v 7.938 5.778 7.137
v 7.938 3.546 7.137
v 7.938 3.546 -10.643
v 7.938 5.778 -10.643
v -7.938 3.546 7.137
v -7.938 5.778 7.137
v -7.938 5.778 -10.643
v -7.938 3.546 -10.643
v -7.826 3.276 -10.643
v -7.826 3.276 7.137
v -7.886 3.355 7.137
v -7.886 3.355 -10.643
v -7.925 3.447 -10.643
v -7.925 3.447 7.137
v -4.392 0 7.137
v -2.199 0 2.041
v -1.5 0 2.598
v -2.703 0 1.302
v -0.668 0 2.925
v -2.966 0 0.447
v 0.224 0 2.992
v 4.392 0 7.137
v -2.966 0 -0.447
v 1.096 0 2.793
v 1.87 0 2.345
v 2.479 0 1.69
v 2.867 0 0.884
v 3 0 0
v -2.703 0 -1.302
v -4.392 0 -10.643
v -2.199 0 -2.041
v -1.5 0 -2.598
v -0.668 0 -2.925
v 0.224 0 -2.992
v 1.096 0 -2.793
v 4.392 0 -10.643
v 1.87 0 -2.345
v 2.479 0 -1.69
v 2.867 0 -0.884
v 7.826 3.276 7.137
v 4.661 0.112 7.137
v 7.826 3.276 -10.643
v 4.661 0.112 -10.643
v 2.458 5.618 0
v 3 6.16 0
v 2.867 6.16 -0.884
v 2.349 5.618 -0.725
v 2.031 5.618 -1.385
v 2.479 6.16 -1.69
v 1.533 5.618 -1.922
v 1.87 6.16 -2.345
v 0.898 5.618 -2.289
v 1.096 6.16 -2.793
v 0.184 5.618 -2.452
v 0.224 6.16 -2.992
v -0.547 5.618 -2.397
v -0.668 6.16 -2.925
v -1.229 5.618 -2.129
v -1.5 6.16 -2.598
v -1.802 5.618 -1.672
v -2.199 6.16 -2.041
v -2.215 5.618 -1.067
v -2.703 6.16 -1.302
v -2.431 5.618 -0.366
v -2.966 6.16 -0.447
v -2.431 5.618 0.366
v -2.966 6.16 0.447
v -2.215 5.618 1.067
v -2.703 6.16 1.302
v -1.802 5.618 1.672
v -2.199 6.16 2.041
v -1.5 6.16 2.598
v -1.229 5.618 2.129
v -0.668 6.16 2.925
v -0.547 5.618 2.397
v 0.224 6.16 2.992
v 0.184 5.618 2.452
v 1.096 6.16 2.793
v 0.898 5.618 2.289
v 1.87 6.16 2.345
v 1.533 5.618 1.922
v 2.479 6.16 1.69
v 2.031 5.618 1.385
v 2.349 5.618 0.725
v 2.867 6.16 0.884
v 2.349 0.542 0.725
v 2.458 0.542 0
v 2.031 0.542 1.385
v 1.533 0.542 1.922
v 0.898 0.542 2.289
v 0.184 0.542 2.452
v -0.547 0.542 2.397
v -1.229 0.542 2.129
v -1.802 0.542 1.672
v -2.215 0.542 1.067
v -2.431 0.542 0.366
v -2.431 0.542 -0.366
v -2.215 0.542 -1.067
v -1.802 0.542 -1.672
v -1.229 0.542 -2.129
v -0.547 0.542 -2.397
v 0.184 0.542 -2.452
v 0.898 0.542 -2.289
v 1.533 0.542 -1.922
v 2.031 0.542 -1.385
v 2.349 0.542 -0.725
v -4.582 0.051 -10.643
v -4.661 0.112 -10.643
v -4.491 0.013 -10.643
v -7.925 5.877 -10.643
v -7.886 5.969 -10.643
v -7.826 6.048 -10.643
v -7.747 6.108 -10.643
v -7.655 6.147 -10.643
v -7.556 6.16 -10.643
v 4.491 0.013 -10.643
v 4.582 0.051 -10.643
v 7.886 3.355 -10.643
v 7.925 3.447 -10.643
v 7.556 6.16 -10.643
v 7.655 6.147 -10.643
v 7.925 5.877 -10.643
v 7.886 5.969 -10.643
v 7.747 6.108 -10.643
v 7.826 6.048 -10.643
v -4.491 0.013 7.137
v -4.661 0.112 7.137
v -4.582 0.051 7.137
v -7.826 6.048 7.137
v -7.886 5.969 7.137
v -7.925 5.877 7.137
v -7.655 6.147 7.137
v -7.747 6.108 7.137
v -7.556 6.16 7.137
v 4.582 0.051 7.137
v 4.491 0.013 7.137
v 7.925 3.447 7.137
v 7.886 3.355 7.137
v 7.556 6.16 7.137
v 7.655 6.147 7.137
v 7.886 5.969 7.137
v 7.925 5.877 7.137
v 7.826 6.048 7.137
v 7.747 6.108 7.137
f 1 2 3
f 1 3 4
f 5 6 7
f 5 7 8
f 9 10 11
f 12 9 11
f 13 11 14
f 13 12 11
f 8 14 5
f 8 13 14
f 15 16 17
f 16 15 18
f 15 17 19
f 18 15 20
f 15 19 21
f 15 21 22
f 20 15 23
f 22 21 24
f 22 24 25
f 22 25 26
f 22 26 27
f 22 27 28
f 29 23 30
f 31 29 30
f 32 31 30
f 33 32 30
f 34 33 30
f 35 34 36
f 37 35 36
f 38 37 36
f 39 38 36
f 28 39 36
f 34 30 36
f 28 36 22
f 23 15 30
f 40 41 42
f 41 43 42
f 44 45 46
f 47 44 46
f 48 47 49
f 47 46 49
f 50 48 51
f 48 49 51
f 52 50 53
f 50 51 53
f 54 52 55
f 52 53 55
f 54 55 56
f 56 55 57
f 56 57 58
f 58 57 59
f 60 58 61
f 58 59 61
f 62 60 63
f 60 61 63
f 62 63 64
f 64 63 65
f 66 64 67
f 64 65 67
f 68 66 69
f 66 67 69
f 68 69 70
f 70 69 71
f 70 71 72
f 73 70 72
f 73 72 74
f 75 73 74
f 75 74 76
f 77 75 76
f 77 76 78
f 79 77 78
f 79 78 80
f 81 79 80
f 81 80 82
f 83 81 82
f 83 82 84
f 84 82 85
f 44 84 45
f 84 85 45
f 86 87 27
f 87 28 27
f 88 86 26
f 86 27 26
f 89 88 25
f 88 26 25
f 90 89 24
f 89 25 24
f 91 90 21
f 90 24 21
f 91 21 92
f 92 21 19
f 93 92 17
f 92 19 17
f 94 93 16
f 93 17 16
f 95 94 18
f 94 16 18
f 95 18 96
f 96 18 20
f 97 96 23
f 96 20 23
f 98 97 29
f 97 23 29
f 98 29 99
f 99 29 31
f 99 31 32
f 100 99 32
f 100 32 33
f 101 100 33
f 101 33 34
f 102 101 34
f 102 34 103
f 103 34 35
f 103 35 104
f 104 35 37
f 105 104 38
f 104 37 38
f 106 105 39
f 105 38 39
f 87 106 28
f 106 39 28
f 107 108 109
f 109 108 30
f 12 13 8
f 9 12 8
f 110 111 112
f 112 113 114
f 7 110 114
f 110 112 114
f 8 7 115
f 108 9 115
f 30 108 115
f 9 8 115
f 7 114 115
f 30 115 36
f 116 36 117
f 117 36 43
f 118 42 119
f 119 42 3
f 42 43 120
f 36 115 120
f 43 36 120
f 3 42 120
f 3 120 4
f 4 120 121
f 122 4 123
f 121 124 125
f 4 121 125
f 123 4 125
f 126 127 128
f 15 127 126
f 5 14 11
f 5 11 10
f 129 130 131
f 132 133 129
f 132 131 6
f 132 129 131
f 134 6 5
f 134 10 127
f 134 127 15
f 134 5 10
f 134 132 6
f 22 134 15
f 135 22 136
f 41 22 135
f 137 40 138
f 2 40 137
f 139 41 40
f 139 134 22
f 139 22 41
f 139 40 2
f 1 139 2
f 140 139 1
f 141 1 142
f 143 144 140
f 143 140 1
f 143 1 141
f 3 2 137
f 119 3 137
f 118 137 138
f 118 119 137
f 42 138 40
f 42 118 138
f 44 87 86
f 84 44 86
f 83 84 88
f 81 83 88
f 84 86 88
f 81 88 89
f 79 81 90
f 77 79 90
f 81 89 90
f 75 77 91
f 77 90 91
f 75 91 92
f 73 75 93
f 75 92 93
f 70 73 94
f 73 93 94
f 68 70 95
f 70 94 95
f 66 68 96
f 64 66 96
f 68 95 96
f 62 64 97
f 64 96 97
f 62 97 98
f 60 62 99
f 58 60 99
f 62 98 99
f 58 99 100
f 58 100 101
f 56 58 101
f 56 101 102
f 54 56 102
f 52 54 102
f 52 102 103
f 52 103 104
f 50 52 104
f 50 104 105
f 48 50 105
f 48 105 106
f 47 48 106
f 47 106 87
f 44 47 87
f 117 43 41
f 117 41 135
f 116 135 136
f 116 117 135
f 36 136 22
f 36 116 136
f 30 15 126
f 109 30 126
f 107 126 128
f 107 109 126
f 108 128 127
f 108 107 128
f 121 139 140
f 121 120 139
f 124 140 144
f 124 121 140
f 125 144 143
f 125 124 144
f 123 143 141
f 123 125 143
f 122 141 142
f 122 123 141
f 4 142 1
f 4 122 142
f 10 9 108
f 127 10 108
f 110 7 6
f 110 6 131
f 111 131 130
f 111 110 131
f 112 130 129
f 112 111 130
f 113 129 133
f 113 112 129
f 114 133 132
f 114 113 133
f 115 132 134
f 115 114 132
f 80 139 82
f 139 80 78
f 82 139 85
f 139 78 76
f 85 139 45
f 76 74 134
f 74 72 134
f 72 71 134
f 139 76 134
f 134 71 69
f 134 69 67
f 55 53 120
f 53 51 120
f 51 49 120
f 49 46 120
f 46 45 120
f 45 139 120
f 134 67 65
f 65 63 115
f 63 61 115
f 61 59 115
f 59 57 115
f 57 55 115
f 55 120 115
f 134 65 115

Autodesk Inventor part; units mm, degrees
sketch "Sketch_1" plane through (0, 0, -10.6426) normal (0, 0, 1) x (1, 0, 0)
  line L0 (-7.9375, 5.7785) -> (-7.9375, 3.5455)
  arc A0 (-7.9375, 3.5455) -> (-7.8259, 3.2761) centre (-7.5565, 3.5455) ccw
  line L1 (-7.8259, 3.2761) -> (-4.6614, 0.1116)
  arc A1 (-4.6614, 0.1116) -> (-4.392, 0) centre (-4.392, 0.381) ccw
  line L2 (-4.392, 0) -> (4.392, 0)
  arc A2 (4.392, 0) -> (4.6614, 0.1116) centre (4.392, 0.381) ccw
  line L3 (4.6614, 0.1116) -> (7.8259, 3.2761)
  arc A3 (7.8259, 3.2761) -> (7.9375, 3.5455) centre (7.5565, 3.5455) ccw
  line L4 (7.9375, 3.5455) -> (7.9375, 5.7785)
  arc A4 (7.9375, 5.7785) -> (7.5565, 6.1595) centre (7.5565, 5.7785) ccw
  line L5 (7.5565, 6.1595) -> (-7.5565, 6.1595)
  arc A5 (-7.5565, 6.1595) -> (-7.9375, 5.7785) centre (-7.5565, 5.7785) ccw
extrude "Extrusion1" add sketch "Sketch_1" along normal blind 17.78
sketch "Sketch_4" plane through (0, 0, 0) normal (0, 0, 1) x (1, 0, 0)
  line L0 (0, 0) -> (0, 6.1595)
  line L1 (0, 6.1595) -> (3, 6.1595)
  line L2 (3, 6.1595) -> (2.4585, 5.618)
  line L3 (2.4585, 5.618) -> (2.4585, 0.5415)
  line L4 (2.4585, 0.5415) -> (3, 0)
  line L5 (3, 0) -> (0, 0)
  line L6 (0, 0) -> (0, 6.1595)
revolve "Revolution1" cut sketch "Sketch_4" angle 360 about axis through (0, 0, 0) along (0, -1, 0)
thread "Thread1" size "M6x1" class "6H" standard "ISO Metric profile" full length
ref_plane "tnut_XY" through (0, 6.1595, 0) normal (0, 1, 0) x (1, 0, 0)
ref_plane "tnut_YZ" through (0, 6.1595, 0) normal (1, 0, 0) x (0, 0, -1)
ref_plane "tnut_ZX" through (0, 6.1595, 0) normal (0, 0, -1) x (0, 1, 0)
properties part number "40-1964"
